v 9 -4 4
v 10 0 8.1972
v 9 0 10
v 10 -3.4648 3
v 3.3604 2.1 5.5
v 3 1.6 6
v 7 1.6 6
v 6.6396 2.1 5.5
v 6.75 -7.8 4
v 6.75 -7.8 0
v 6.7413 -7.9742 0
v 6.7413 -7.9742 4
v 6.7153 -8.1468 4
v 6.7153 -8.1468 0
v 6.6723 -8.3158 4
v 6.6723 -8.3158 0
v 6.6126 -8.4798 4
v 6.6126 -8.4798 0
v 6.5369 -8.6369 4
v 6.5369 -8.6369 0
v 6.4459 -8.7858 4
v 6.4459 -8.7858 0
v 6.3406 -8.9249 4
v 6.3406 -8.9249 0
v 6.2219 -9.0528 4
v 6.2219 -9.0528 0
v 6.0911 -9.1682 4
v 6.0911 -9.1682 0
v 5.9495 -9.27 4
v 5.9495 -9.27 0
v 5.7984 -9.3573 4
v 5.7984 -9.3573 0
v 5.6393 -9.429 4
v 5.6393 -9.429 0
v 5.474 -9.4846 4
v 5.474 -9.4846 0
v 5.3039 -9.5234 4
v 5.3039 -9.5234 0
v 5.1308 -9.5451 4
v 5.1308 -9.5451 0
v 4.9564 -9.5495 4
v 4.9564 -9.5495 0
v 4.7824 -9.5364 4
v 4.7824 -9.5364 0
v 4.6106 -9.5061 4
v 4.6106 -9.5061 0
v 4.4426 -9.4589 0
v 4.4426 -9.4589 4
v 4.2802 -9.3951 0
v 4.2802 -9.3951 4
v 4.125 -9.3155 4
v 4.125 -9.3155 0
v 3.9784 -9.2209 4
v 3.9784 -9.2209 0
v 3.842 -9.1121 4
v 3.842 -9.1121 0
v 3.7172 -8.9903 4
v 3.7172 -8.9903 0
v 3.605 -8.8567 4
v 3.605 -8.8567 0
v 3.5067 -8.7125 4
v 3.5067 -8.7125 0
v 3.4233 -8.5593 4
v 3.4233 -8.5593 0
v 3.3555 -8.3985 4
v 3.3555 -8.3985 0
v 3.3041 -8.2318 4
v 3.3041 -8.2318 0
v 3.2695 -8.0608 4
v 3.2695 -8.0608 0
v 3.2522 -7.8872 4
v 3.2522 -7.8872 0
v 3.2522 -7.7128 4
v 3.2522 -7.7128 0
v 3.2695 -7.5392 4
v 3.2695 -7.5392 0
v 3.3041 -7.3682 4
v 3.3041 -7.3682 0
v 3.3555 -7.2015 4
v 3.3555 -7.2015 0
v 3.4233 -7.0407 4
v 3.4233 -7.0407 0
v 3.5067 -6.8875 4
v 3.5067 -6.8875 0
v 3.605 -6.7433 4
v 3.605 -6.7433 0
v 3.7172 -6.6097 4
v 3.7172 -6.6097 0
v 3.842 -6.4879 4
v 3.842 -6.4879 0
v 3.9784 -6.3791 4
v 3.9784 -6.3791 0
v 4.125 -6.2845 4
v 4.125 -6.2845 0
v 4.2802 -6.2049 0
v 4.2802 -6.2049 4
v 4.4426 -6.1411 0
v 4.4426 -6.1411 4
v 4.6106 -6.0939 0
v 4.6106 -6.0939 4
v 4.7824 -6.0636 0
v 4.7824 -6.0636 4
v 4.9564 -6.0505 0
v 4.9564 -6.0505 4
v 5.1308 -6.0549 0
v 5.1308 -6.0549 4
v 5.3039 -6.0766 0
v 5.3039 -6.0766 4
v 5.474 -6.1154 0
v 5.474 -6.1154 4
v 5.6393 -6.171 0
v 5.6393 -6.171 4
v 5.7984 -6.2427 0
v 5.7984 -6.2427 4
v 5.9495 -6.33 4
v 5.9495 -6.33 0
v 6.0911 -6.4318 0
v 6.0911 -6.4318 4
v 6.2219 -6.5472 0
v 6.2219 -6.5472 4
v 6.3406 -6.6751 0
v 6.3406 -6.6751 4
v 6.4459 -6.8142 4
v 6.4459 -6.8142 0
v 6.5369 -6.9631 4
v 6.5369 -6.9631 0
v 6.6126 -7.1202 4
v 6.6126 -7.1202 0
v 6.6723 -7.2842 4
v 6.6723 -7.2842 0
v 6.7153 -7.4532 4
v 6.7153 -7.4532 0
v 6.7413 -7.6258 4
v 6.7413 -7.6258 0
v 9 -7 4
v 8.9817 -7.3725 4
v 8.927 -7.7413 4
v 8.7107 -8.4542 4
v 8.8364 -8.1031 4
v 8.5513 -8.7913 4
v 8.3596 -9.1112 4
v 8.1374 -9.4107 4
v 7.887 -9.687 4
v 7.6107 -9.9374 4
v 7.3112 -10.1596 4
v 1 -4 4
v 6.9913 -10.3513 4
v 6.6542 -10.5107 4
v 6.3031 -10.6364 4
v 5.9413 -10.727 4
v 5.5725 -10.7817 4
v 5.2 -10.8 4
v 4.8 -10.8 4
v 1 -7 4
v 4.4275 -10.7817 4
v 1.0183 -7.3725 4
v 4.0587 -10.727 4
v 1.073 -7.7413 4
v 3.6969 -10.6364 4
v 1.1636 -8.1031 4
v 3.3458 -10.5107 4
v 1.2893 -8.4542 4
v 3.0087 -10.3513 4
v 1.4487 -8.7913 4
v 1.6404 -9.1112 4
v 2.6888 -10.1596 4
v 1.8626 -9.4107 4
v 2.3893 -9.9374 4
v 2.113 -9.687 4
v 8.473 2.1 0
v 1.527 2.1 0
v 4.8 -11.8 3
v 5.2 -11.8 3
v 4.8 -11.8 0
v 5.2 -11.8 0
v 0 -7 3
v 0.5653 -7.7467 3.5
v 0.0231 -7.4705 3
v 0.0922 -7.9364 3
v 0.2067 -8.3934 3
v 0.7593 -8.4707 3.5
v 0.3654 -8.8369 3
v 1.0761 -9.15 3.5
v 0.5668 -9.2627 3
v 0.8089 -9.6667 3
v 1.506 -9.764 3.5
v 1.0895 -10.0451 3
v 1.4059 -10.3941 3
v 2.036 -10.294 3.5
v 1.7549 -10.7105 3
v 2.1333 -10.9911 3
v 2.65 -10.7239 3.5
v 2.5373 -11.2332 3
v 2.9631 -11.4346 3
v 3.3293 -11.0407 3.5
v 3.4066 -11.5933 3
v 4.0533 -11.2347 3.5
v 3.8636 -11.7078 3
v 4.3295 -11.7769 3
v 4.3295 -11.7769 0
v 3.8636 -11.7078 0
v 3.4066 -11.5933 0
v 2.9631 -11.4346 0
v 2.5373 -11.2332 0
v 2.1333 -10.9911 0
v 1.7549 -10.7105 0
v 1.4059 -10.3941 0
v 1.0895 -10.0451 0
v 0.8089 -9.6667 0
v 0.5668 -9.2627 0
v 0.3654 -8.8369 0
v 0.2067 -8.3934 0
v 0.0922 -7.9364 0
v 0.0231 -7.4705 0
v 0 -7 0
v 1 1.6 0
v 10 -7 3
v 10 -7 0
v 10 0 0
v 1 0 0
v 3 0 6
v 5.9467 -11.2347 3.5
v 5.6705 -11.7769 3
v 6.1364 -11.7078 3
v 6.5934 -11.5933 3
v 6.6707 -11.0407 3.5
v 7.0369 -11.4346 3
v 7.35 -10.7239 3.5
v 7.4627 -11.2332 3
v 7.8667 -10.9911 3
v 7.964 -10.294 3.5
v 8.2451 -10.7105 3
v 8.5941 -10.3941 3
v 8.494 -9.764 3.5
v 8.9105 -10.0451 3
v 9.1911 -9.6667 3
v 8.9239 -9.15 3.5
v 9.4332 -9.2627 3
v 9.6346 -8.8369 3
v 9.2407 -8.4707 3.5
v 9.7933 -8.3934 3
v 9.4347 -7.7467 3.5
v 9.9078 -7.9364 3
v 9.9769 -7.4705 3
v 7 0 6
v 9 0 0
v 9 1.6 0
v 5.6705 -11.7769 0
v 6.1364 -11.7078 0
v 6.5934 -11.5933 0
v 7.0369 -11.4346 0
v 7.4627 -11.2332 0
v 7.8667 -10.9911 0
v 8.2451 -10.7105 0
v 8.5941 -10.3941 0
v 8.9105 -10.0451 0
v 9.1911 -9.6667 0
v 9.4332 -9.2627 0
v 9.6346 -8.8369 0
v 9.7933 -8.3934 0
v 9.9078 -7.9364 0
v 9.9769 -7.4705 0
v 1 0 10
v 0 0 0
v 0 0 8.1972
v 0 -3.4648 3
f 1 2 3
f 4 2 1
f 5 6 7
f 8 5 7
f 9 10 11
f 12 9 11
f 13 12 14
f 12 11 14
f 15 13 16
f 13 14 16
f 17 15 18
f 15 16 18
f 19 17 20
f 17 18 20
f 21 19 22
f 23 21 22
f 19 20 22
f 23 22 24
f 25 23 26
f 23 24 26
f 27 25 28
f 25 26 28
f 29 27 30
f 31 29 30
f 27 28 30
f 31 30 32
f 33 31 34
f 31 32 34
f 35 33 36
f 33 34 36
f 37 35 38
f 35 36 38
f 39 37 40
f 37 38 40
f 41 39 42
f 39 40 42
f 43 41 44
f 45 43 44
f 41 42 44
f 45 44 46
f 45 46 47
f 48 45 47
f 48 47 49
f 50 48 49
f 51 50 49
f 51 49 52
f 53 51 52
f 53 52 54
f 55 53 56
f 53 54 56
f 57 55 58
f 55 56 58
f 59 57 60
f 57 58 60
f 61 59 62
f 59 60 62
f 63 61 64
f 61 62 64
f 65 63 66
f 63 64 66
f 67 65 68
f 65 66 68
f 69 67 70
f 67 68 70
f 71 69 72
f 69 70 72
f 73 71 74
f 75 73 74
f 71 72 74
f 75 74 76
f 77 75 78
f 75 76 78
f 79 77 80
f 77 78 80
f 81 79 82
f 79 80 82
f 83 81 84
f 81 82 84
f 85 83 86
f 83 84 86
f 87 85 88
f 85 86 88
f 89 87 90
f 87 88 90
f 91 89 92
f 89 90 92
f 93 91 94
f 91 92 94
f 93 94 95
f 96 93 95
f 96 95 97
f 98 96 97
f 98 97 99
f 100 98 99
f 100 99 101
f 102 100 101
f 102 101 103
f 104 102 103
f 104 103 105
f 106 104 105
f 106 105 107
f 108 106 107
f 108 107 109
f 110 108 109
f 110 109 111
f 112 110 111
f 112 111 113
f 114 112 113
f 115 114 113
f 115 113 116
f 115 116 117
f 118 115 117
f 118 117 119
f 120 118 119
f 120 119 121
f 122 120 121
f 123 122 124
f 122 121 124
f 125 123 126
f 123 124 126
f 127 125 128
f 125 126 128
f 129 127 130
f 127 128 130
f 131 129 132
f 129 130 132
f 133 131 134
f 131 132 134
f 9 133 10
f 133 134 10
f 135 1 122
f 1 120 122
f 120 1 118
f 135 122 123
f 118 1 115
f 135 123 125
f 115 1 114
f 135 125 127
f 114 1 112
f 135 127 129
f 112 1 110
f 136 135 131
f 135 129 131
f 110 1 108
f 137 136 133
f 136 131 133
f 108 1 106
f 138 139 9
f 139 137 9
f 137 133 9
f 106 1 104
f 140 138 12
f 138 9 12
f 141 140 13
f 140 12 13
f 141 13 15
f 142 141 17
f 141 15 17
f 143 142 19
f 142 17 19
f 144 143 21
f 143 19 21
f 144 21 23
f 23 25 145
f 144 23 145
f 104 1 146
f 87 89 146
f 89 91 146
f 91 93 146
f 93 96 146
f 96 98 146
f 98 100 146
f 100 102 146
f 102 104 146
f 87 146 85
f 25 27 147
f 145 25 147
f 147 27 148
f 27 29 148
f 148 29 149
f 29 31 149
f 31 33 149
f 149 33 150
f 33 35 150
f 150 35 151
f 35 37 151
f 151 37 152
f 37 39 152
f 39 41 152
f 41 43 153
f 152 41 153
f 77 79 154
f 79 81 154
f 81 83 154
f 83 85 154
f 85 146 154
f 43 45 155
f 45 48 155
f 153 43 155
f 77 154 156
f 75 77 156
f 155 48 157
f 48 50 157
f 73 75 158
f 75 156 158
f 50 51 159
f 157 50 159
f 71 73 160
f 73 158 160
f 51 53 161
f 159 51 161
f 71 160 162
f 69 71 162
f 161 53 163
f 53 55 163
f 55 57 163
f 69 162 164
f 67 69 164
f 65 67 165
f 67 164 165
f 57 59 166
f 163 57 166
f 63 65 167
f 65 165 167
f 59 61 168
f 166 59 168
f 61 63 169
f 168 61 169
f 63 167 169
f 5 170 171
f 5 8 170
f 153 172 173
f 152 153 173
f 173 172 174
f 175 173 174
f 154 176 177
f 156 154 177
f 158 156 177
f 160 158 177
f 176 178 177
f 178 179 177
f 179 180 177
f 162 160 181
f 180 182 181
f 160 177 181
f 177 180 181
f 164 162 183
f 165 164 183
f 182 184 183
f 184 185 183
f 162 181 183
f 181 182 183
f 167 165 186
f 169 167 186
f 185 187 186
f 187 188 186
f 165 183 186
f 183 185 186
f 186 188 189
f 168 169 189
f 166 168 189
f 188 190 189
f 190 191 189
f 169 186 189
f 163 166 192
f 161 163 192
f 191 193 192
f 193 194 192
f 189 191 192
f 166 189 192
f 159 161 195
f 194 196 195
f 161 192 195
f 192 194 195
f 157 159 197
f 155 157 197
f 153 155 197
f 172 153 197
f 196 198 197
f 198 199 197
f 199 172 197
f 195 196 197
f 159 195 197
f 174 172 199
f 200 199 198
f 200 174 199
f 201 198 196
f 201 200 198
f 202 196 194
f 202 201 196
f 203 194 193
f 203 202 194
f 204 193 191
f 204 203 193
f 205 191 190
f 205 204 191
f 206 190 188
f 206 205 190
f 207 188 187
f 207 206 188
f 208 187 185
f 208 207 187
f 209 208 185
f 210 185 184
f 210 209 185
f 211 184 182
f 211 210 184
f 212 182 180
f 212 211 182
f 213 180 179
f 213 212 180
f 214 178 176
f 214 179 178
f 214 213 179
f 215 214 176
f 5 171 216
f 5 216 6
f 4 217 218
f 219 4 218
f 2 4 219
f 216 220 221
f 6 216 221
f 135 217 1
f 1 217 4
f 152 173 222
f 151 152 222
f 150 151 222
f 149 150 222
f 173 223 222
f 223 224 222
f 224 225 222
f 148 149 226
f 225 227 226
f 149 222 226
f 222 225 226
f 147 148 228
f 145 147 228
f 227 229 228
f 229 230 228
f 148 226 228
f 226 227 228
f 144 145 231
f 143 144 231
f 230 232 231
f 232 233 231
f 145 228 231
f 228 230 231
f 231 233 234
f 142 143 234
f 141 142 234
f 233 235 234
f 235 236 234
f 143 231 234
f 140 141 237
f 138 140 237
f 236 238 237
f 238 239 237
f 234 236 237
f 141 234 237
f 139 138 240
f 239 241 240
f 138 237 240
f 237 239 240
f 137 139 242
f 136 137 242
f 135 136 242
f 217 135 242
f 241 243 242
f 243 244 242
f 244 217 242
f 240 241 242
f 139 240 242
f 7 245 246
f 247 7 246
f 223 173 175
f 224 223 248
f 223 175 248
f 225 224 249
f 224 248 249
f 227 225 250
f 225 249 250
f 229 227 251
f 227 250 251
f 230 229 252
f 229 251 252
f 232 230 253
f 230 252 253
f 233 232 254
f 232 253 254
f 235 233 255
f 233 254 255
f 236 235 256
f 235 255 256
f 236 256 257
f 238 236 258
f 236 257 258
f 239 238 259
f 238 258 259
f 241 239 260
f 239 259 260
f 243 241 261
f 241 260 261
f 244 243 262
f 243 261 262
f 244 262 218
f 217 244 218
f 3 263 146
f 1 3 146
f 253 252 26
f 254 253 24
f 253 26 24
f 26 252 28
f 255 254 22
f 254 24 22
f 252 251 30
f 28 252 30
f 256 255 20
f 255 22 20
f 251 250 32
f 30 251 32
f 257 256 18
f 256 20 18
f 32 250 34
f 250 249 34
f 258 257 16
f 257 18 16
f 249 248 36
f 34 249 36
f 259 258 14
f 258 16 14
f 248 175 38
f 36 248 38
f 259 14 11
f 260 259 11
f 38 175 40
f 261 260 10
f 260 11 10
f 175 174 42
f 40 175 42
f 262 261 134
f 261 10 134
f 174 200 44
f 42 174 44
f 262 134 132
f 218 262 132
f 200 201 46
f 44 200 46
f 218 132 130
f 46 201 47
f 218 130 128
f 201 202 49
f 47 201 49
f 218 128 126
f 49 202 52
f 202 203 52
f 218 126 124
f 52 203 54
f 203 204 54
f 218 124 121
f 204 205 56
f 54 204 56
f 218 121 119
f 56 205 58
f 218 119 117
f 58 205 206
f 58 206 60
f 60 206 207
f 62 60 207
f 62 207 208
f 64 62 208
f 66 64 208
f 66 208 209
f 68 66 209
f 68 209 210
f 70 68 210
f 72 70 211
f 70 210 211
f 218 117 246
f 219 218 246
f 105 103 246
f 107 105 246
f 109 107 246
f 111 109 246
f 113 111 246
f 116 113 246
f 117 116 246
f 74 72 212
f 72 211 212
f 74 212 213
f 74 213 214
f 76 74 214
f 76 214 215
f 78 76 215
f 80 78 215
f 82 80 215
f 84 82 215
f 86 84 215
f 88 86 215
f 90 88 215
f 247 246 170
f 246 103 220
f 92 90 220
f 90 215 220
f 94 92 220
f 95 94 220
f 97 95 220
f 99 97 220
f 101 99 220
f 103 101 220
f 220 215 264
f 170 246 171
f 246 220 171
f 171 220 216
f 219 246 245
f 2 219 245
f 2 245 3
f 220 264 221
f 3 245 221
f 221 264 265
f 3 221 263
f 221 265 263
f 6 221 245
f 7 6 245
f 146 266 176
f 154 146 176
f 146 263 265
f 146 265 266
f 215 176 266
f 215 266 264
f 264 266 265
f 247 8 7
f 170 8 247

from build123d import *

# Parameters (mm, degrees)
F1_DEPTH = 10
F2_R     = 1.75
F3_DEPTH = 4
F5_DEPTH = 2.1
F6_R     = 4.8
F7_SIZE  = 1
F8_SIZE  = 0.5


with BuildPart() as f1:
    # F0 (on Right) → F1 (new body)
    with BuildSketch(Plane.YZ):
        Polygon((-11.8, 4), (-11.8, 0), (0, 0), (0, 10), (-4, 4), align=None)
    extrude(amount=F1_DEPTH)

    # F2 (on face) → F3 (cut, through all)
    with BuildSketch(Plane(origin=(0, 0, 0), x_dir=(1, 0, 0), z_dir=(0, 0, -1))):
        with Locations((5, 7.8)):
            Circle(F2_R)
    extrude(amount=-F3_DEPTH, mode=Mode.SUBTRACT)

    # F4 (on face) → F5 (join)
    with BuildSketch(Plane(origin=(0, 0, 0), x_dir=(-1, 0, 0), z_dir=(0, 1, 0))):
        Polygon((-7, 6), (-9, 0), (-1, 0), (-3, 6), align=None)
    extrude(amount=F5_DEPTH)

    # F6
    f6_edges = [f1.edges().sort_by_distance(p)[0] for p in [
        (0, -11.8, 2),
        (10, -11.8, 2),
    ]]
    fillet(f6_edges, radius=F6_R)

    # F7
    f7_edges = [f1.edges().sort_by_distance(p)[0] for p in [
        (0, -5.5, 4),
        (0, -2, 7),
        (10, -2, 7),
    ]]
    chamfer(f7_edges, length=F7_SIZE)

    # F8
    f8_edges = [f1.edges().sort_by_distance(p)[0] for p in [
        (2, 2.1, 3),
        (5, 2.1, 6),
        (8, 2.1, 3),
    ]]
    chamfer(f8_edges, length=F8_SIZE)


solid = f1.part
